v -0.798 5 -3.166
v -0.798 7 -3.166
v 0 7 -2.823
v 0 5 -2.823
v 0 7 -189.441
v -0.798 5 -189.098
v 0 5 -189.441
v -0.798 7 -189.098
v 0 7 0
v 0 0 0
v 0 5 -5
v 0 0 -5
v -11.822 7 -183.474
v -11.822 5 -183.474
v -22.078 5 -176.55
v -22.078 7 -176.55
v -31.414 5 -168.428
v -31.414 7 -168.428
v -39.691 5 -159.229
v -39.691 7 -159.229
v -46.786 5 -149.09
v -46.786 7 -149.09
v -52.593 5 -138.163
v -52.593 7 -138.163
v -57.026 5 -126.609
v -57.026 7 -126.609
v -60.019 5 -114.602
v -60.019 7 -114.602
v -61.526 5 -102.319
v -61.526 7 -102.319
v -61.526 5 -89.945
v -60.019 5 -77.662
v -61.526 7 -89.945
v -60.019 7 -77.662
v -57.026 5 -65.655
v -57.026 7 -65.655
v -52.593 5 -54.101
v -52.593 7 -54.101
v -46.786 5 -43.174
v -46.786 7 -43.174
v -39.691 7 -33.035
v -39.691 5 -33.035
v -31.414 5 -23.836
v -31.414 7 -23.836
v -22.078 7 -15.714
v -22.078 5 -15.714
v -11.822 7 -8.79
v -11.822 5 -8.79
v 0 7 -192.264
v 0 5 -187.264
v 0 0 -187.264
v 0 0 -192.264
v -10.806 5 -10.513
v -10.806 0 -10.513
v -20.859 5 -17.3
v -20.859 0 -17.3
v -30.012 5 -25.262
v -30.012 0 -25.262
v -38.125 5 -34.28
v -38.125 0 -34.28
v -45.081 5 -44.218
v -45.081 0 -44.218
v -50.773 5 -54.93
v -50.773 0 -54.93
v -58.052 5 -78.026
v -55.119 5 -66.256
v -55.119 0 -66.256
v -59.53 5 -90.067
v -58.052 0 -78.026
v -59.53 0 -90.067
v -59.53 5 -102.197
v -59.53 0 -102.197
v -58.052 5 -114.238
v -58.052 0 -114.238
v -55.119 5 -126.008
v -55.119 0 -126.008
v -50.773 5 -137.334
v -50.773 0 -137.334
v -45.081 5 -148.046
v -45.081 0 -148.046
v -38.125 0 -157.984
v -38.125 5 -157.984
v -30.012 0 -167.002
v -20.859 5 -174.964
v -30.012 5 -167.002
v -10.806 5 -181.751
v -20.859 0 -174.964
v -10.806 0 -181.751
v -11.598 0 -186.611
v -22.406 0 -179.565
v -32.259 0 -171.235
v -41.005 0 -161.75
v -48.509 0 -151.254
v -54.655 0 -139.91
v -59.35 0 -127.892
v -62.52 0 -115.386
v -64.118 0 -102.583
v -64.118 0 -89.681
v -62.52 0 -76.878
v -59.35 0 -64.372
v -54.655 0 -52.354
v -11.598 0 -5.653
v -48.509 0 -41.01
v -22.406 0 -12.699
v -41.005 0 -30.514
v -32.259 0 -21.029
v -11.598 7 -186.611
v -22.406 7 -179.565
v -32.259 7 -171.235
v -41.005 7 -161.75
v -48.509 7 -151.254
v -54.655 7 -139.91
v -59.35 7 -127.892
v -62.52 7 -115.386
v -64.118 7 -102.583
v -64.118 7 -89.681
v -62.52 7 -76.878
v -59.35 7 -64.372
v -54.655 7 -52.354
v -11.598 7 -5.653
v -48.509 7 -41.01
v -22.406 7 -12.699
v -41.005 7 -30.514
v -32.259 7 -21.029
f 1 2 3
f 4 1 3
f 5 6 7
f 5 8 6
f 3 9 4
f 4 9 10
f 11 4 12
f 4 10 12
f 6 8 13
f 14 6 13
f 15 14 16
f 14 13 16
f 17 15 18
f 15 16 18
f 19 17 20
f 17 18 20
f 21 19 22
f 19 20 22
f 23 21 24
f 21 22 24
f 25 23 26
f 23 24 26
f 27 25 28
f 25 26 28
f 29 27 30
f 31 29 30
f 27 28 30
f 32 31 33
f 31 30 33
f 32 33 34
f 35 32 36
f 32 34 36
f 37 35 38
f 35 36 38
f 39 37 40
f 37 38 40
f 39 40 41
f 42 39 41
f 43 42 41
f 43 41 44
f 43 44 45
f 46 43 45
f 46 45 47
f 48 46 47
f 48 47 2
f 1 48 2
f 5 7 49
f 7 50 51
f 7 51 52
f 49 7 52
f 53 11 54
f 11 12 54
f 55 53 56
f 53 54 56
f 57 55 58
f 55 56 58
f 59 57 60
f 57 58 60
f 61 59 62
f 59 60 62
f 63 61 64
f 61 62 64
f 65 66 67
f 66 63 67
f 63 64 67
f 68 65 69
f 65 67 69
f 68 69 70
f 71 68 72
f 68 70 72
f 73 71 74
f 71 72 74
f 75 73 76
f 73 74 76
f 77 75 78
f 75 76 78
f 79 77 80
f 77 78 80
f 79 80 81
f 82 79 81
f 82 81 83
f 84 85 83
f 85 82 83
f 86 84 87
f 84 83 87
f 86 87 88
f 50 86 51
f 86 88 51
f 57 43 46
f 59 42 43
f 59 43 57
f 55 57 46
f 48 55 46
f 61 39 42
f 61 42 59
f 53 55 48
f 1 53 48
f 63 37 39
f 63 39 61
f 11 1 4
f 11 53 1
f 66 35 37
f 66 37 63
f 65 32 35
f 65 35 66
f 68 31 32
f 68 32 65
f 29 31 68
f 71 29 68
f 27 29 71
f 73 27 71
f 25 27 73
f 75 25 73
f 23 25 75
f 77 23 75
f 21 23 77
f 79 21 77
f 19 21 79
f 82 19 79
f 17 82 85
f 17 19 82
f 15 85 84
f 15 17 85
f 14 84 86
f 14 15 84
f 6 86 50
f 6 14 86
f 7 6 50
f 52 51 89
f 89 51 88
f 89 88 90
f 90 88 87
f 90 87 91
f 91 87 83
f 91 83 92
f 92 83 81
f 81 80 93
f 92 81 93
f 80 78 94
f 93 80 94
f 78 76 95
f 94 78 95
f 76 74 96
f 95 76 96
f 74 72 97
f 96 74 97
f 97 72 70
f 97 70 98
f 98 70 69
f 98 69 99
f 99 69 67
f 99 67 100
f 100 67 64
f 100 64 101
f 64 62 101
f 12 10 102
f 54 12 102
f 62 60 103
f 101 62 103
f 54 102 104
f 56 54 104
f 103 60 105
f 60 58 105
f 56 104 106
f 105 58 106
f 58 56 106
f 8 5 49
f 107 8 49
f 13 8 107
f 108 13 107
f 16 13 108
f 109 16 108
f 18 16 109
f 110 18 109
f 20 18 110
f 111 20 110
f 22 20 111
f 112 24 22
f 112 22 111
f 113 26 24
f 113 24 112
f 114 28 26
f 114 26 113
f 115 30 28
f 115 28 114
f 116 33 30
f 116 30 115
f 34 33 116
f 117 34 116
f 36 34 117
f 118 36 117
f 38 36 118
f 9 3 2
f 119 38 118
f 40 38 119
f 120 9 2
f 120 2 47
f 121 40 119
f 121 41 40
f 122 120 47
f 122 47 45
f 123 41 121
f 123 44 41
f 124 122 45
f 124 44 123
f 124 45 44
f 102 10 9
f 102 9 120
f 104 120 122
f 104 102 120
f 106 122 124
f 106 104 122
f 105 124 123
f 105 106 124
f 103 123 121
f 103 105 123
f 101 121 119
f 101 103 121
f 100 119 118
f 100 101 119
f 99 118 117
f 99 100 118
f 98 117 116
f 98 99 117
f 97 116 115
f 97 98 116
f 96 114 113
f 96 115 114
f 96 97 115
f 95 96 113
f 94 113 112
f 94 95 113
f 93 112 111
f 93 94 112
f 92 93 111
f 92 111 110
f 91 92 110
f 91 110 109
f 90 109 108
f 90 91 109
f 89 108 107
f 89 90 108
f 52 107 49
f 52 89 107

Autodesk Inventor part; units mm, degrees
ref_plane "YZ Plane" through (0, 0, 0) normal (1, 0, 0) x (0, 1, 0)
ref_plane "XZ Plane" through (0, 0, 0) normal (0, 1, 0) x (-1, 0, 0)
ref_plane "XY Plane" through (0, 0, 0) normal (0, 0, 1) x (1, 0, 0)
sketch "Эскиз1" plane through (0, 0, 0) normal (0, 1, 0) x (-1, 0, 0)
  line L0 (0, 0) -> (0, -192.264)
  arc A0 (0, -192.264) -> (0, 0) centre (-39.6817, -96.132) ccw
  line L1 (0, 0) -> (0, -5)
  line L2 (0, -192.264) -> (0, -187.264)
  arc A1 (0, -187.264) -> (0, -5) centre (-39.6817, -96.132) ccw
  dimension "d0" = 192.264
  dimension "d1" = 104
  dimension "d2" = 5
  dimension "d3" = 5
  dimension "d4" = 99.3966
extrude "Выдавливание1" add sketch "Эскиз1" along normal blind 7 contours A0 L0 A1
sketch "Эскиз2" plane through (0, 7, 0) normal (0, 1, 0) x (1, 0, 0)
  arc A0 (0, 187.264) -> (0, 5) centre (39.6817, 96.132) ccw projected
  arc A1 (-0.7985, 189.0977) -> (-0.7985, 3.1663) centre (39.6817, 96.132) ccw
  line L0 (-0.7985, 3.1663) -> (0, 2.8227)
  line L1 (-0.7985, 189.0977) -> (0, 189.4413)
  line L2 (0, 0) -> (0, 5) projected
  line L3 (0, 2.8227) -> (0, 5)
  line L4 (0, 189.4413) -> (0, 187.264)
  arc A2 (0, 187.264) -> (0, 5) centre (39.6817, 96.132) ccw
  dimension "d8" = 2
extrude "Выдавливание2" cut sketch "Эскиз2" against normal blind 2
sketch "Эскиз3" plane through (0, 0, 0) normal (1, 0, 0) x (0, 1, 0)
  line L0 (5, -91.132) -> (0, -91.132)
  line L1 (0, -91.132) -> (0, -101.132)
  line L2 (0, -101.132) -> (5, -101.132)
  line L3 (5, -101.132) -> (5, -91.132)
  line L4 (0, -187.264) -> (5, -187.264) projected
  point P0 (2.5, -187.264)
  point P1 (2.5, -101.132)
  dimension "d11" = 5
  dimension "d12" = 10
  dimension "d13" = 86.132
